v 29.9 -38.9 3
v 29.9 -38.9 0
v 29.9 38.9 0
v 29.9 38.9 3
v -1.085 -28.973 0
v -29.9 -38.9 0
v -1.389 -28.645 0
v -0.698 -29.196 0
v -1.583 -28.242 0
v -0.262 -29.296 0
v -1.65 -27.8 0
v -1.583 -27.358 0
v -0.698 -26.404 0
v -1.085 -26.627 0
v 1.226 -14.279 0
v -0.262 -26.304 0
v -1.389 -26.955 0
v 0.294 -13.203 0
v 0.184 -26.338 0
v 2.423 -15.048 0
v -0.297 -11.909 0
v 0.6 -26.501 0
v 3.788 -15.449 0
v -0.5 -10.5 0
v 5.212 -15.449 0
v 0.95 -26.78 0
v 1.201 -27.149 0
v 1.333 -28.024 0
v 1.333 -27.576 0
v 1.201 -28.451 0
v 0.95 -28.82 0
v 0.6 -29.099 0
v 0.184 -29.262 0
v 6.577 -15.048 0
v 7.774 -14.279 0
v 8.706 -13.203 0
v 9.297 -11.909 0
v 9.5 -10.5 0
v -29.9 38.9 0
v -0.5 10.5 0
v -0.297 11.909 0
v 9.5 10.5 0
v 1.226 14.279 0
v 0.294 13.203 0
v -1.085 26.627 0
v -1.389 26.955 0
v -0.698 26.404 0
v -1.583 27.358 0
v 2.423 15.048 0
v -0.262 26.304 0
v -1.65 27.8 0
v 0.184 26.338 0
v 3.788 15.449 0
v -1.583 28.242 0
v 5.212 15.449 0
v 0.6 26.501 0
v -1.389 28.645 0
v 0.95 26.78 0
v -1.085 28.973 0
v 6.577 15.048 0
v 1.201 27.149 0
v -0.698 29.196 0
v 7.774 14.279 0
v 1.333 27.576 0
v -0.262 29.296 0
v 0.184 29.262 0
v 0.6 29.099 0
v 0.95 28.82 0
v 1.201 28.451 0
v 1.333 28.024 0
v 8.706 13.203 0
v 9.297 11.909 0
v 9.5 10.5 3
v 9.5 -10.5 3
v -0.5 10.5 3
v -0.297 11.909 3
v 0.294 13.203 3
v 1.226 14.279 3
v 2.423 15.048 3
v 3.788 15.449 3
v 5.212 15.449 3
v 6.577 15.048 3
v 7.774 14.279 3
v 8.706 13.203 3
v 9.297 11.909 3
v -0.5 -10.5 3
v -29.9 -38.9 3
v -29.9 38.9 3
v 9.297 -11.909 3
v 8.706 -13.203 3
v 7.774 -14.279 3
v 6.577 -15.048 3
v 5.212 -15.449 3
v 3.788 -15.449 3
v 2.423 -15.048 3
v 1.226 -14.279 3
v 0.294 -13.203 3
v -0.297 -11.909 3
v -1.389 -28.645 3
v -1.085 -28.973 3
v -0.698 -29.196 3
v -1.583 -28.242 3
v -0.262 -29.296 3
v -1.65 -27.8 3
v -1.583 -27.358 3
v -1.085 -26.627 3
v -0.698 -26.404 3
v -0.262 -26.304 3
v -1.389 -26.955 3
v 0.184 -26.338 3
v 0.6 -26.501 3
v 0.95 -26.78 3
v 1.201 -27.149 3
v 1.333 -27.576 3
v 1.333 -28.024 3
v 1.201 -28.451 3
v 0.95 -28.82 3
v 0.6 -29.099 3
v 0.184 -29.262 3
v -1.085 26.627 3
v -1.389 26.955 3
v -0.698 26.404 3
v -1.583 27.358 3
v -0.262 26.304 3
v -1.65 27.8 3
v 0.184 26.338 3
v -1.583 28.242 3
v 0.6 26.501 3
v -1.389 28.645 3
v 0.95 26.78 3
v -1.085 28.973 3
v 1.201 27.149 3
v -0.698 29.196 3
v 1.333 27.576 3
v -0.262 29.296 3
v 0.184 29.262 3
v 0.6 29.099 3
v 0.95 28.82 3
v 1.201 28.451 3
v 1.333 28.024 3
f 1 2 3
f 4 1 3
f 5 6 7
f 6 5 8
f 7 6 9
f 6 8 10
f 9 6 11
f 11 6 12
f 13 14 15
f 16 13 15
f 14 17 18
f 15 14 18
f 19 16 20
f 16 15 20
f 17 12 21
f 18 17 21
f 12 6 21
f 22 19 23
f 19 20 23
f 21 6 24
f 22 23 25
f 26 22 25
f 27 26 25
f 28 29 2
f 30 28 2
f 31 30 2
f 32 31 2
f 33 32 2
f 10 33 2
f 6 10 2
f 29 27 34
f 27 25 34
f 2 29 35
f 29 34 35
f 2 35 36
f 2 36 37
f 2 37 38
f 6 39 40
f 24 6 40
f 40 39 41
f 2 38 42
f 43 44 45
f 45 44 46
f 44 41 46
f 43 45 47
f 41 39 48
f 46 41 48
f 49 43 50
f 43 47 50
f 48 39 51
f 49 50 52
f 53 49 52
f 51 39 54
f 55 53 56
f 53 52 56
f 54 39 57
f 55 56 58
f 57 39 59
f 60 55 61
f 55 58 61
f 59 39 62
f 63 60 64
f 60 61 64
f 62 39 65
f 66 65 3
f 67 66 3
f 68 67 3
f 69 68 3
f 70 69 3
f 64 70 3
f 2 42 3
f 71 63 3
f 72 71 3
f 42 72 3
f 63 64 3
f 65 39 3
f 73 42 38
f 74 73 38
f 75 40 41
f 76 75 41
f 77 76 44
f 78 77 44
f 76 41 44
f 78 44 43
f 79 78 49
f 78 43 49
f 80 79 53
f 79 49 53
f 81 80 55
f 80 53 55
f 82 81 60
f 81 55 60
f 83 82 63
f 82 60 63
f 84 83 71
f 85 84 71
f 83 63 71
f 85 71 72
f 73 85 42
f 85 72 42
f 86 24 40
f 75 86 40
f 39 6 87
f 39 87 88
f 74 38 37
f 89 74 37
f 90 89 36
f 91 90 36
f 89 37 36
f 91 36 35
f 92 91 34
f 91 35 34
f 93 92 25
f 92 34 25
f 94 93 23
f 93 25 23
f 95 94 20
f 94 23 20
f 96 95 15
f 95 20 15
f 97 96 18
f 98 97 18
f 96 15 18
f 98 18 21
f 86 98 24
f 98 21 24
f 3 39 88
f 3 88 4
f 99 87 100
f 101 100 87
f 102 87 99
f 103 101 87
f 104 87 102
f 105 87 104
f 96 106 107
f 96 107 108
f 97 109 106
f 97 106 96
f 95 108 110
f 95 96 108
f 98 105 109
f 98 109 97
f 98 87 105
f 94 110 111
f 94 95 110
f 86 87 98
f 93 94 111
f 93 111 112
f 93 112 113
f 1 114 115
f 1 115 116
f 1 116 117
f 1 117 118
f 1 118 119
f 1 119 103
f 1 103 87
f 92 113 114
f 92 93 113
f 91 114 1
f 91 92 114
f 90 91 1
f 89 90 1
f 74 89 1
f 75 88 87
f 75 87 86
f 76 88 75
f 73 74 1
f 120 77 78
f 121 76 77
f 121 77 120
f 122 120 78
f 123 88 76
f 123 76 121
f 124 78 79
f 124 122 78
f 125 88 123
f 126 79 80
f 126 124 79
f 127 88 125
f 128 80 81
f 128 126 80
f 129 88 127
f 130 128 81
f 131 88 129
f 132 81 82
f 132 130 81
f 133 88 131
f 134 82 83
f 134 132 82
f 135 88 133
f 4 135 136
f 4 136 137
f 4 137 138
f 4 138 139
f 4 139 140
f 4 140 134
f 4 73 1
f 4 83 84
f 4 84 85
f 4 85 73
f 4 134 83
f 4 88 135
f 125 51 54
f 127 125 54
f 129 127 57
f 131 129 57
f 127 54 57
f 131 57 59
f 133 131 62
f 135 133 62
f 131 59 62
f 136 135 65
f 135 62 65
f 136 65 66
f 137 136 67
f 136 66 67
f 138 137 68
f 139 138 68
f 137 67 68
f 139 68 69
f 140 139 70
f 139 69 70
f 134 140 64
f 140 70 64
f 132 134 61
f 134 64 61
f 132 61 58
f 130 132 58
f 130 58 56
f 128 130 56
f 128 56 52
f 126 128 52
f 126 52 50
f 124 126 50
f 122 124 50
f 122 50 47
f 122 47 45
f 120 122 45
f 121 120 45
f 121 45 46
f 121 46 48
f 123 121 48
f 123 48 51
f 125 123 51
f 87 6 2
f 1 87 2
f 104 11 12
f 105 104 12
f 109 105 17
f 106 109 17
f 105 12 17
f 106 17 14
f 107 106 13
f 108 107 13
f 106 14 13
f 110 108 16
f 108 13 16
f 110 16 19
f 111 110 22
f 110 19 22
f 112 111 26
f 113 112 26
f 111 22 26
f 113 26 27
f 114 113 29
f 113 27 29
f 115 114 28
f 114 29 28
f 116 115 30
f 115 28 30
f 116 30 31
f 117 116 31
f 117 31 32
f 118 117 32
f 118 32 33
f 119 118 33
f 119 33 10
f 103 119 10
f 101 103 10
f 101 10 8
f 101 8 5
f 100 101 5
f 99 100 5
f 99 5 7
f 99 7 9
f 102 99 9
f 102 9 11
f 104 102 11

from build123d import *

# Parameters (mm, degrees)
SKETCH1_W           = 59.8
SKETCH1_H           = 77.8
BOSS_EXTRUDE1_DEPTH = 3
SKETCH2_R           = 1.5
CUT_EXTRUDE1_DEPTH  = 50.155060777


with BuildPart() as part:
    # Sketch1 → Boss-Extrude1 (new body)
    with BuildSketch(Plane.XY):
        Rectangle(SKETCH1_W, SKETCH1_H)
    extrude(amount=BOSS_EXTRUDE1_DEPTH)

    # Sketch2 → Cut-Extrude1 (cut, through all)
    with BuildSketch(Plane(origin=(0, 0, 0), x_dir=(-1, 0, 0), z_dir=(0, 0, -1))):
        with Locations((0.15, -27.8)):
            Circle(SKETCH2_R)
        with Locations((0.15, 27.8)):
            Circle(SKETCH2_R)
        with BuildLine():
            Line((0.5, -10.5), (0.5, 10.5))
            ThreePointArc((0.5, 10.5), (-4.5, 15.5), (-9.5, 10.5))
            Line((-9.5, 10.5), (-9.5, -10.5))
            ThreePointArc((-9.5, -10.5), (-4.5, -15.5), (0.5, -10.5))
        make_face()
    extrude(amount=-CUT_EXTRUDE1_DEPTH, mode=Mode.SUBTRACT)


solid = part.part
